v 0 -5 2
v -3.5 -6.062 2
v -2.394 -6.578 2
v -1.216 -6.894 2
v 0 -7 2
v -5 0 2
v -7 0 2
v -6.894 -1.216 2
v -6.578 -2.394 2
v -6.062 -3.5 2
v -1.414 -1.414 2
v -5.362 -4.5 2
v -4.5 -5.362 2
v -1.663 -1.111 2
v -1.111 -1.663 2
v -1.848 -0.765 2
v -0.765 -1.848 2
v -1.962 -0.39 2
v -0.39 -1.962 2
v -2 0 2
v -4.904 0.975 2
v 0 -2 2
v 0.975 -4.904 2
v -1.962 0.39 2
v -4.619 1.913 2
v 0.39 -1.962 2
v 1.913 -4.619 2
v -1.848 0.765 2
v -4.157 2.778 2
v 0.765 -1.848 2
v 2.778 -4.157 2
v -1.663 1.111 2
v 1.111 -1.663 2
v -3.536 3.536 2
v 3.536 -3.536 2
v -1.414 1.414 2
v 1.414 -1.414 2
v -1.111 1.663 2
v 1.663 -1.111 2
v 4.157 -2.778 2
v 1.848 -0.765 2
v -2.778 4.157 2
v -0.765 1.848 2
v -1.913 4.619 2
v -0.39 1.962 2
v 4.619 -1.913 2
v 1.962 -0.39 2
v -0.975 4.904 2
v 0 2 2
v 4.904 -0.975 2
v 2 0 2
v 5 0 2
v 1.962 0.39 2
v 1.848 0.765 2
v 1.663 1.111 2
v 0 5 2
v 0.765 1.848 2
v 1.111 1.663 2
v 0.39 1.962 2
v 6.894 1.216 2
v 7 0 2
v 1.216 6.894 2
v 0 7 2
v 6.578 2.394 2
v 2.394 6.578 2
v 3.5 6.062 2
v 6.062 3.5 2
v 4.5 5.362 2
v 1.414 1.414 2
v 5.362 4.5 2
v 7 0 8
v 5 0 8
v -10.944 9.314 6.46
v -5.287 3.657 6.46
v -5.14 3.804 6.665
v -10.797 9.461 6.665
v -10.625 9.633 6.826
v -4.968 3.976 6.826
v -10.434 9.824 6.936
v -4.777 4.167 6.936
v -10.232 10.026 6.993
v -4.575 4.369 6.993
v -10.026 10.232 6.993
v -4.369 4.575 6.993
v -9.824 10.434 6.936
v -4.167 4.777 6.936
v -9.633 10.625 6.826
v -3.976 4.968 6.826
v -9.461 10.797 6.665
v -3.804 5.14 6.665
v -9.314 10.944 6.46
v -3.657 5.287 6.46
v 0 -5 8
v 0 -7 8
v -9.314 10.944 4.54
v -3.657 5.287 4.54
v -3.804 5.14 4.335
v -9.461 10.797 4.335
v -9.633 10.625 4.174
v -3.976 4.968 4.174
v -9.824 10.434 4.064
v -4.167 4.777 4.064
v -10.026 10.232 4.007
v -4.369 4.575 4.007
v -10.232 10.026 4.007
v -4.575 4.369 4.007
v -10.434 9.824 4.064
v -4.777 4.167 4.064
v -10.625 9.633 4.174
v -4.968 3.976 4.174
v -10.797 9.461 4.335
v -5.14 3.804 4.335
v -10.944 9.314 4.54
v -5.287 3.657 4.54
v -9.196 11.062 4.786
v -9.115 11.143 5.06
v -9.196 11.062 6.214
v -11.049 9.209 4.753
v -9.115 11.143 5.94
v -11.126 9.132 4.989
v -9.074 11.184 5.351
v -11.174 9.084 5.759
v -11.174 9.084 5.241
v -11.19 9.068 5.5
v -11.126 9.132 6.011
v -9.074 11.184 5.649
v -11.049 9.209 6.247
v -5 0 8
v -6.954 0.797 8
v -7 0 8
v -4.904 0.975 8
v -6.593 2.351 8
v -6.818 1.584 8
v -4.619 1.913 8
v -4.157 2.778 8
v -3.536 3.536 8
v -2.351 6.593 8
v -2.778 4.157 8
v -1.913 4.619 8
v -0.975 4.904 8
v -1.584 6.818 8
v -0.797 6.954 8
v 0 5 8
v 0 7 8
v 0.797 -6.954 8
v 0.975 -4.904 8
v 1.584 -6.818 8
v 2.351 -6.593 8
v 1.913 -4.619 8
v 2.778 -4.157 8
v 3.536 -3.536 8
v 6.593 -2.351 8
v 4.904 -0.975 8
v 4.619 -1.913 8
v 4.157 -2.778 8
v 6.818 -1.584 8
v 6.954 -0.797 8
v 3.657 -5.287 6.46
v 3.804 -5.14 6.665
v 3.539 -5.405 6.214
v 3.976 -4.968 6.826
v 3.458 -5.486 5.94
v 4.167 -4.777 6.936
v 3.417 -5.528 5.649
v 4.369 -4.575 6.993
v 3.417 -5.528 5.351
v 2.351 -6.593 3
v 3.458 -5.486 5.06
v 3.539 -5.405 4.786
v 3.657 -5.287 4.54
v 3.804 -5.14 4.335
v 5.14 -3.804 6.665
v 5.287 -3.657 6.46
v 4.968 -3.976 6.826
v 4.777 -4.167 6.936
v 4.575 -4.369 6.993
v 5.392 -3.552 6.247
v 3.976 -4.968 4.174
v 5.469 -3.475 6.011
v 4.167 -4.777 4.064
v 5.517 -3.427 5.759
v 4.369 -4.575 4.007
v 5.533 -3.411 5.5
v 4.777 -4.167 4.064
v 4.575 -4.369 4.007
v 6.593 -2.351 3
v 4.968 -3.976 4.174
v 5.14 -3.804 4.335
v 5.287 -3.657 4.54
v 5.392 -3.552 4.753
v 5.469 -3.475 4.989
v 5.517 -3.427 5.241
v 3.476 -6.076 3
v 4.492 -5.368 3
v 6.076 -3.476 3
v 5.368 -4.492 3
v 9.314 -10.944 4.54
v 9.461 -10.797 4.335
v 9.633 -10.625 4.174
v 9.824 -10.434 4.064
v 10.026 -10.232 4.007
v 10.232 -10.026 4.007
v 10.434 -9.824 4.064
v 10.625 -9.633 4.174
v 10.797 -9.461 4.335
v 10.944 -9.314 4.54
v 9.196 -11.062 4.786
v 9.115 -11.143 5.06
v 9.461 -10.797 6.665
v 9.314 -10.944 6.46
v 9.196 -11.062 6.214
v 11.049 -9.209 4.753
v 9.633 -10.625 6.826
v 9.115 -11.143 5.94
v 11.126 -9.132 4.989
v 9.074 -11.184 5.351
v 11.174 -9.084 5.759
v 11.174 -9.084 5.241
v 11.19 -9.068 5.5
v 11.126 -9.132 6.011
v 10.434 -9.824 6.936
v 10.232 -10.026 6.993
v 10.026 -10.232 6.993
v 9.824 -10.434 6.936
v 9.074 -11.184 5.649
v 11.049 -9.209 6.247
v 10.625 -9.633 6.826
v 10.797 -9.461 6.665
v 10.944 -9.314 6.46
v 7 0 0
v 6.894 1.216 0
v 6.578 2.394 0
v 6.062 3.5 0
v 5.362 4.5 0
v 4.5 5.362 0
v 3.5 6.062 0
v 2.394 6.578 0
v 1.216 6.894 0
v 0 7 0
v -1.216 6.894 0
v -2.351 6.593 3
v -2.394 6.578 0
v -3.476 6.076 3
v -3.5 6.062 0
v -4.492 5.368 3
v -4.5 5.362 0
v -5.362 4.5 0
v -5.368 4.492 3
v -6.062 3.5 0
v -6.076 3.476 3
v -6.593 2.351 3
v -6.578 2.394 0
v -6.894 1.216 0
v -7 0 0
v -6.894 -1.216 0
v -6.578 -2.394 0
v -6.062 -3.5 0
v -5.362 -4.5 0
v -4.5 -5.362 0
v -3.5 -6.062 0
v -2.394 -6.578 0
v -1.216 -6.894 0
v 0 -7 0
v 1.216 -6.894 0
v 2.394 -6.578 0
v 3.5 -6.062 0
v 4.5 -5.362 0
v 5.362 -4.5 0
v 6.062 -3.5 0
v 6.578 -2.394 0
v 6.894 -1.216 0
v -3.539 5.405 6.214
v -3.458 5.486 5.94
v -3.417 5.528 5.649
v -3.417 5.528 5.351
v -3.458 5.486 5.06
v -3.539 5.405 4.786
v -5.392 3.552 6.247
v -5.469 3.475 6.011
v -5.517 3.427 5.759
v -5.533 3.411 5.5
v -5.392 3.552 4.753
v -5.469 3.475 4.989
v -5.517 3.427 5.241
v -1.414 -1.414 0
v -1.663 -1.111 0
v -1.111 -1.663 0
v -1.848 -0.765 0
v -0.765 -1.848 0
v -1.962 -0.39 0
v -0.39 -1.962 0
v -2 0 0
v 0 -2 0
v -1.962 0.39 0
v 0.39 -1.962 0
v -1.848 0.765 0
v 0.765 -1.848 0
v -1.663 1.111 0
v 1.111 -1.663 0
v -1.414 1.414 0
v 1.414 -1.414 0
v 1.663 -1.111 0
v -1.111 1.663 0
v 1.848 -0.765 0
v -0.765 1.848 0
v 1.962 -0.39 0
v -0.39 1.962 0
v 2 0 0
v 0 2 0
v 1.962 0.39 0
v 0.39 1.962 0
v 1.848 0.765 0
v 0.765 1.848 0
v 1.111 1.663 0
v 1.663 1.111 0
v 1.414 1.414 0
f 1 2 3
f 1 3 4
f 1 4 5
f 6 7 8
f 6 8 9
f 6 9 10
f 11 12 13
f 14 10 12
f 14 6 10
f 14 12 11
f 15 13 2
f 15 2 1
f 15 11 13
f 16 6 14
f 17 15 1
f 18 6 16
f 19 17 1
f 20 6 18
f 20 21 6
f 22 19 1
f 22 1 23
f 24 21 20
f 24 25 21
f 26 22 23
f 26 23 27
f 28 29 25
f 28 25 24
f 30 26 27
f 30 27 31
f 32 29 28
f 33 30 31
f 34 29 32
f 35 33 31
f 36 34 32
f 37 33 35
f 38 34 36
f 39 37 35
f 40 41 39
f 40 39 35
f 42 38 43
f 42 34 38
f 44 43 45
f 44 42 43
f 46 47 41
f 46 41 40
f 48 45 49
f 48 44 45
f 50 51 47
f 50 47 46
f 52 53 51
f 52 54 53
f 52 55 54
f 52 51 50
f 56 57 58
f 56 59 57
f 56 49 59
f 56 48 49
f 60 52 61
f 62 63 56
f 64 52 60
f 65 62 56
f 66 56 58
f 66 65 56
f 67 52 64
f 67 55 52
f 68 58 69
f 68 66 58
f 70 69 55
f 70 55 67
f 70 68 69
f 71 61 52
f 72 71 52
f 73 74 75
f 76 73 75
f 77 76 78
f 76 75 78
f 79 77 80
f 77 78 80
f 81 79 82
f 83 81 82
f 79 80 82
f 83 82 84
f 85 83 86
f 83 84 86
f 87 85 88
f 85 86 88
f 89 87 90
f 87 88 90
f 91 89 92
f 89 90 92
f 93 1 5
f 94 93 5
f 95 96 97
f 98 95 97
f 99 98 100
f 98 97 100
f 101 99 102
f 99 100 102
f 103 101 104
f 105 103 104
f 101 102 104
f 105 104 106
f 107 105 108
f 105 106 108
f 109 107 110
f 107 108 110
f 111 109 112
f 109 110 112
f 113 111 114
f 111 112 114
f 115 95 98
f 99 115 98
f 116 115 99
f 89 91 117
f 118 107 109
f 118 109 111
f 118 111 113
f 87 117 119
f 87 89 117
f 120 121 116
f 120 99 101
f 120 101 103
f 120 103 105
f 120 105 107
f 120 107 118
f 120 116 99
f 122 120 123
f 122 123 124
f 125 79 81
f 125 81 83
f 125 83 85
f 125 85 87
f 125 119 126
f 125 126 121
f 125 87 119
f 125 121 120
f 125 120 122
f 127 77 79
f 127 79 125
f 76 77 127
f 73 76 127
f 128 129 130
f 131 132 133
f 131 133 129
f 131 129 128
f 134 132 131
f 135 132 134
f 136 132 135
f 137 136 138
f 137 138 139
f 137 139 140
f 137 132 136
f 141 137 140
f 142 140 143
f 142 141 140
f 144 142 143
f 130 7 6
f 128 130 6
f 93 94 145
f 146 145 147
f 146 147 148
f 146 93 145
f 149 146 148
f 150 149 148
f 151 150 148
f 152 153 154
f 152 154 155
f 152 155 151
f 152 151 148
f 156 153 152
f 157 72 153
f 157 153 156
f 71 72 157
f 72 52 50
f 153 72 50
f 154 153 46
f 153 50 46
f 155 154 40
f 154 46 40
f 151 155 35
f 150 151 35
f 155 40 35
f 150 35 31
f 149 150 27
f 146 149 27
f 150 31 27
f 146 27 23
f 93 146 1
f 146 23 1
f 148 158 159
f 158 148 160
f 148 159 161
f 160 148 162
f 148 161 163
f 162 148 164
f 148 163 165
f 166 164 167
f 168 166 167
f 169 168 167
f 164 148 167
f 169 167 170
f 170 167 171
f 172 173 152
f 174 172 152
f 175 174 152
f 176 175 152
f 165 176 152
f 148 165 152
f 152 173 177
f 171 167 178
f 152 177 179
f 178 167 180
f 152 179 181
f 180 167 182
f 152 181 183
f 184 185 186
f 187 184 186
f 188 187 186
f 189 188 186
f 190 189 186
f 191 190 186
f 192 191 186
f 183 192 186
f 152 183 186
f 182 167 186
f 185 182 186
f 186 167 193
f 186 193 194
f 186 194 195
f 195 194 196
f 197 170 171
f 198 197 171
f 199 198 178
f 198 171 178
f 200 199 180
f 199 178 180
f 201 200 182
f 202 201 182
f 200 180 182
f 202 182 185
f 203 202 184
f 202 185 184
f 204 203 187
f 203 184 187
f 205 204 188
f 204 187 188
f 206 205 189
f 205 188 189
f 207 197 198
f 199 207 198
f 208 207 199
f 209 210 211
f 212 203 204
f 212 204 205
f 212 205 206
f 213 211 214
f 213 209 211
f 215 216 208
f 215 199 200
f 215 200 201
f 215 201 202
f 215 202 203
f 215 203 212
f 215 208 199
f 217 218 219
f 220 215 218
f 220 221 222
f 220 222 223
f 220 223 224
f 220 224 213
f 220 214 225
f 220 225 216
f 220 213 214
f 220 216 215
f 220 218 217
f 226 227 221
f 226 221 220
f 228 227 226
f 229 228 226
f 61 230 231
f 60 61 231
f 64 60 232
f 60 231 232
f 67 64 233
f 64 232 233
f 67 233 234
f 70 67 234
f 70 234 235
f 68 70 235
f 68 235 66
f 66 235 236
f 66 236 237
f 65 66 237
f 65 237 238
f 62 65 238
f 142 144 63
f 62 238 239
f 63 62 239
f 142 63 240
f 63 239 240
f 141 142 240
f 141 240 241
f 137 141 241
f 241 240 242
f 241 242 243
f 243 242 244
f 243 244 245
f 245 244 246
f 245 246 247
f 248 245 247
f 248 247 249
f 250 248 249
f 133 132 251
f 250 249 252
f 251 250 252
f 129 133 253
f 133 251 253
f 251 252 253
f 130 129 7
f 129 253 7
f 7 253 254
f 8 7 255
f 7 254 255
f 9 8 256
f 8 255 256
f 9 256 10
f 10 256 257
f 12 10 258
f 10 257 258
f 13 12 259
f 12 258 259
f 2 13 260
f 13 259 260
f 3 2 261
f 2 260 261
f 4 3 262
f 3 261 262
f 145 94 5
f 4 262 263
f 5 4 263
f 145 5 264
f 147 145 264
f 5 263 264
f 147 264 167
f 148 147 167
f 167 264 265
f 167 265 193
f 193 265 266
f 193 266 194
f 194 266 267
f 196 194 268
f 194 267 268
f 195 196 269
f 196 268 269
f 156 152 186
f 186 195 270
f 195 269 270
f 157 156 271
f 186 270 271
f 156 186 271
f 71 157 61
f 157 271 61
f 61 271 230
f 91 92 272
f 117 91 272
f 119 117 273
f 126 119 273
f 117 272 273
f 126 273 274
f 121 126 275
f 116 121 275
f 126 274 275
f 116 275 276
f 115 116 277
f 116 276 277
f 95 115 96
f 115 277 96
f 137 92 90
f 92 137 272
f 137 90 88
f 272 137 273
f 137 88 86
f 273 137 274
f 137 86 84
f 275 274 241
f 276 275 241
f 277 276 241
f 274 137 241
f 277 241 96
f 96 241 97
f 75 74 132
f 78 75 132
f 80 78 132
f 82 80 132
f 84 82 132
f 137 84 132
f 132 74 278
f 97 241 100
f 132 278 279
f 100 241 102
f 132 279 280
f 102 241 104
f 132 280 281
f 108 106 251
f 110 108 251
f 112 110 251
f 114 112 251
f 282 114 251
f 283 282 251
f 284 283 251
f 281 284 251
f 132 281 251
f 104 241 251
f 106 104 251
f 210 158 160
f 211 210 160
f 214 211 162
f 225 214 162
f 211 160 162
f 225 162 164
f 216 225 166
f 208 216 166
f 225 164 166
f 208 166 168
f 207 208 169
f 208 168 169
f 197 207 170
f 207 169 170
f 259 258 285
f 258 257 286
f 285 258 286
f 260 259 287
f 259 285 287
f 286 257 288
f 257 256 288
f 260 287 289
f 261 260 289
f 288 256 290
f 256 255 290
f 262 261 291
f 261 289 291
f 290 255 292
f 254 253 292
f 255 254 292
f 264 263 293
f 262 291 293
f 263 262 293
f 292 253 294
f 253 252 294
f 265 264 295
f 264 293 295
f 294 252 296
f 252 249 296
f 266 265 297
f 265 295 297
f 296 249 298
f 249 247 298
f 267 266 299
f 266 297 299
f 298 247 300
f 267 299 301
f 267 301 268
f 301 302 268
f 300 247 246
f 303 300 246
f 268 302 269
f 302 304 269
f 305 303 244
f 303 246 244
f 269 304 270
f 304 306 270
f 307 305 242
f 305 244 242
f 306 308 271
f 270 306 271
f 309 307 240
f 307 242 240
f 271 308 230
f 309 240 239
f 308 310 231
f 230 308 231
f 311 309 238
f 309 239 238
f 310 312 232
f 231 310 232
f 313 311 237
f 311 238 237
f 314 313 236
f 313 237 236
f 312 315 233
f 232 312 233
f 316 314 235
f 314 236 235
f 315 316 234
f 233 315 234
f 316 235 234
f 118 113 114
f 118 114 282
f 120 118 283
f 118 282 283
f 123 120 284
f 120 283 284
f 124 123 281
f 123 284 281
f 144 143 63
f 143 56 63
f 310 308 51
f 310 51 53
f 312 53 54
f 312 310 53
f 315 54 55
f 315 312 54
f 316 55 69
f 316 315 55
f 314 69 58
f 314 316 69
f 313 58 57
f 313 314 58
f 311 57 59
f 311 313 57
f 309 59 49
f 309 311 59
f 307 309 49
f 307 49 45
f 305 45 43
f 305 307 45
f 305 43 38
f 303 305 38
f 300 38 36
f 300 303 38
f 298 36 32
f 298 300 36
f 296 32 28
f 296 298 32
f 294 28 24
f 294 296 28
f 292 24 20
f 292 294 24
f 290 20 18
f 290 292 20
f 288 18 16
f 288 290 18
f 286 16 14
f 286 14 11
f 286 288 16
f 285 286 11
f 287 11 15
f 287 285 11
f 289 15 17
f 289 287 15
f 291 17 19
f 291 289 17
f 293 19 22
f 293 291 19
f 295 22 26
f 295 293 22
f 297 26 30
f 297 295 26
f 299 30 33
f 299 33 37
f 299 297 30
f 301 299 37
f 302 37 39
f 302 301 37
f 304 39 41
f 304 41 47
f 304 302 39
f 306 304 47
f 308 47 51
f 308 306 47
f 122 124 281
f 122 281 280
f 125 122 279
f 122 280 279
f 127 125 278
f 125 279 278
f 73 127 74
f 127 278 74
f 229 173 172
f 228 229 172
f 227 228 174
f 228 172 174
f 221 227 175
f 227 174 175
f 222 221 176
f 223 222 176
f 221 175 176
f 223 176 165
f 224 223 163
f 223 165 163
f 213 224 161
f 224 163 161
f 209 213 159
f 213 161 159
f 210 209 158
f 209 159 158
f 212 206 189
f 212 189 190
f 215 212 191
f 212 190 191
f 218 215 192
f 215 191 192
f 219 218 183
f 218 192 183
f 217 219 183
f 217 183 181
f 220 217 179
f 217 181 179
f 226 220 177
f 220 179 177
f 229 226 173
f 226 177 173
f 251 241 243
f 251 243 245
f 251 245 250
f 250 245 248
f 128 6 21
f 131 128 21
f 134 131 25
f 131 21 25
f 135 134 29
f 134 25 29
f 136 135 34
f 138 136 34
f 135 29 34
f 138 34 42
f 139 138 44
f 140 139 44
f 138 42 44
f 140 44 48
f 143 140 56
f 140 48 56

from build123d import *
from build123d import SkipClean  # not in build123d's __all__

# Parameters (mm, degrees)
F0_R     = 2
F1_DEPTH = 2
F3_DEPTH = 1
F5_DEPTH = 5
F8_DEPTH = 8
F9_DEPTH = 8


with BuildPart() as f1:
    # F0 (on Top) → F1 (new body)
    with BuildSketch(Plane.XY):
        with BuildLine():
            ThreePointArc((-5, 0), (-3.5355339059, 3.5355339059), (0, 5))
            Line((0, 5), (0, 7))
            ThreePointArc((0, 7), (-4.9497474683, 4.9497474683), (-7, 0))
            Line((-7, 0), (-5, 0))
        make_face()
        with BuildLine():
            ThreePointArc((0, 5), (3.5355339059, 3.5355339059), (5, 0))
            Line((5, 0), (7, 0))
            ThreePointArc((7, 0), (4.9497474683, 4.9497474683), (0, 7))
            Line((0, 7), (0, 5))
        make_face()
        with BuildLine():
            Line((7, 0), (5, 0))
            ThreePointArc((5, 0), (3.5355339059, -3.5355339059), (0, -5))
            Line((0, -5), (0, -7))
            ThreePointArc((0, -7), (4.9497474683, -4.9497474683), (7, 0))
        make_face()
        with BuildLine():
            Line((0, -7), (0, -5))
            ThreePointArc((0, -5), (-3.5355339059, -3.5355339059), (-5, 0))
            Line((-5, 0), (-7, 0))
            ThreePointArc((-7, 0), (-4.9497474683, -4.9497474683), (0, -7))
        make_face()
        with BuildLine():
            ThreePointArc((0, -5), (3.5355339059, -3.5355339059), (5, 0))
            ThreePointArc((5, 0), (3.5355339059, 3.5355339059), (0, 5))
            ThreePointArc((0, 5), (-3.5355339059, 3.5355339059), (-5, 0))
            ThreePointArc((-5, 0), (-3.5355339059, -3.5355339059), (0, -5))
        make_face()
        Circle(F0_R, mode=Mode.SUBTRACT)
    extrude(amount=F1_DEPTH)

    # F2 (on face) → F3 (join)
    with BuildSketch(Plane.XY.offset(2)):
        with BuildLine():
            ThreePointArc((-5, 0), (-3.5355339059, 3.5355339059), (0, 5))
            Line((0, 5), (0, 7))
            ThreePointArc((0, 7), (-1.1928549598, 6.8976153158), (-2.3508156114, 6.5934562986))
            Line((-2.3508156114, 6.5934562986), (-6.5934562986, 2.3508156114))
            ThreePointArc((-6.5934562986, 2.3508156114), (-6.8976153158, 1.1928549598), (-7, 0))
            Line((-7, 0), (-5, 0))
        make_face()
        with BuildLine():
            Line((-6.5934562986, 2.3508156114), (-2.3508156114, 6.5934562986))
            ThreePointArc((-2.3508156114, 6.5934562986), (-4.9497474683, 4.9497474683), (-6.5934562986, 2.3508156114))
        make_face()
        with BuildLine():
            ThreePointArc((2.3508156114, -6.5934562986), (4.9497474683, -4.9497474683), (6.5934562986, -2.3508156114))
            Line((6.5934562986, -2.3508156114), (2.3508156114, -6.5934562986))
        make_face()
        with BuildLine():
            Line((7, 0), (5, 0))
            ThreePointArc((5, 0), (3.5355339059, -3.5355339059), (0, -5))
            Line((0, -5), (0, -7))
            ThreePointArc((0, -7), (1.1928549598, -6.8976153158), (2.3508156114, -6.5934562986))
            Line((2.3508156114, -6.5934562986), (6.5934562986, -2.3508156114))
            ThreePointArc((6.5934562986, -2.3508156114), (6.8976153158, -1.1928549598), (7, 0))
        make_face()
    with SkipClean():  # cleaning this boolean's faces spoils the solid; the shape is the same uncleaned
        extrude(amount=F3_DEPTH)

    # F4 (on face) → F5 (join)
    with BuildSketch(Plane.XY.offset(3)):
        with BuildLine():
            ThreePointArc((-5, 0), (-3.5355339059, 3.5355339059), (0, 5))
            Line((0, 5), (0, 7))
            ThreePointArc((0, 7), (-1.1928549598, 6.8976153158), (-2.3508156114, 6.5934562986))
            Line((-2.3508156114, 6.5934562986), (-6.5934562986, 2.3508156114))
            ThreePointArc((-6.5934562986, 2.3508156114), (-6.8976153158, 1.1928549598), (-7, 0))
            Line((-7, 0), (-5, 0))
        make_face()
        with BuildLine():
            Line((7, 0), (5, 0))
            ThreePointArc((5, 0), (3.5355339059, -3.5355339059), (0, -5))
            Line((0, -5), (0, -7))
            ThreePointArc((0, -7), (1.1928549598, -6.8976153158), (2.3508156114, -6.5934562986))
            Line((2.3508156114, -6.5934562986), (6.5934562986, -2.3508156114))
            ThreePointArc((6.5934562986, -2.3508156114), (6.8976153158, -1.1928549598), (7, 0))
        make_face()
    extrude(amount=F5_DEPTH)

    # F7 (on face) → F8 (join)
    with BuildSketch(Plane(origin=(4.472135955, -4.472135955, 0), x_dir=(0.7071067812, 0.7071067812, 0), z_dir=(0.7071067812, -0.7071067812, 0))):
        with BuildLine():
            Line((1.1523319194, 6.4602765995), (0, 5.5))
            Line((0, 5.5), (1.1523319194, 4.5397234005))
            ThreePointArc((1.1523319194, 4.5397234005), (1.4104073665, 4.9893621044), (1.5, 5.5))
            ThreePointArc((1.5, 5.5), (1.4104073665, 6.0106378956), (1.1523319194, 6.4602765995))
        make_face()
        with BuildLine():
            Line((0, 5.5), (-1.1523319194, 6.4602765995))
            ThreePointArc((-1.1523319194, 6.4602765995), (-1.5, 5.5), (-1.1523319194, 4.5397234005))
            Line((-1.1523319194, 4.5397234005), (0, 5.5))
        make_face()
        with BuildLine():
            ThreePointArc((1.1523319194, 6.4602765995), (0, 7), (-1.1523319194, 6.4602765995))
            Line((-1.1523319194, 6.4602765995), (0, 5.5))
            Line((0, 5.5), (1.1523319194, 6.4602765995))
        make_face()
        with BuildLine():
            Line((1.1523319194, 4.5397234005), (0, 5.5))
            Line((0, 5.5), (-1.1523319194, 4.5397234005))
            ThreePointArc((-1.1523319194, 4.5397234005), (0, 4), (1.1523319194, 4.5397234005))
        make_face()
    extrude(amount=F8_DEPTH)

    # F6 (on face) → F9 (join)
    with BuildSketch(Plane(origin=(-4.472135955, 4.472135955, 0), x_dir=(-0.7071067812, -0.7071067812, 0), z_dir=(-0.7071067812, 0.7071067812, 0))):
        with BuildLine():
            ThreePointArc((1.1523319194, 6.4602765995), (0, 7), (-1.1523319194, 6.4602765995))
            Line((-1.1523319194, 6.4602765995), (0, 5.5))
            Line((0, 5.5), (1.1523319194, 6.4602765995))
        make_face()
        with BuildLine():
            Line((1.1523319194, 6.4602765995), (0, 5.5))
            Line((0, 5.5), (1.1523319194, 4.5397234005))
            ThreePointArc((1.1523319194, 4.5397234005), (1.4104073665, 4.9893621044), (1.5, 5.5))
            ThreePointArc((1.5, 5.5), (1.4104073665, 6.0106378956), (1.1523319194, 6.4602765995))
        make_face()
        with BuildLine():
            Line((1.1523319194, 4.5397234005), (0, 5.5))
            Line((0, 5.5), (-1.1523319194, 4.5397234005))
            ThreePointArc((-1.1523319194, 4.5397234005), (0, 4), (1.1523319194, 4.5397234005))
        make_face()
        with BuildLine():
            Line((0, 5.5), (-1.1523319194, 6.4602765995))
            ThreePointArc((-1.1523319194, 6.4602765995), (-1.5, 5.5), (-1.1523319194, 4.5397234005))
            Line((-1.1523319194, 4.5397234005), (0, 5.5))
        make_face()
    extrude(amount=F9_DEPTH)


solid = f1.part
